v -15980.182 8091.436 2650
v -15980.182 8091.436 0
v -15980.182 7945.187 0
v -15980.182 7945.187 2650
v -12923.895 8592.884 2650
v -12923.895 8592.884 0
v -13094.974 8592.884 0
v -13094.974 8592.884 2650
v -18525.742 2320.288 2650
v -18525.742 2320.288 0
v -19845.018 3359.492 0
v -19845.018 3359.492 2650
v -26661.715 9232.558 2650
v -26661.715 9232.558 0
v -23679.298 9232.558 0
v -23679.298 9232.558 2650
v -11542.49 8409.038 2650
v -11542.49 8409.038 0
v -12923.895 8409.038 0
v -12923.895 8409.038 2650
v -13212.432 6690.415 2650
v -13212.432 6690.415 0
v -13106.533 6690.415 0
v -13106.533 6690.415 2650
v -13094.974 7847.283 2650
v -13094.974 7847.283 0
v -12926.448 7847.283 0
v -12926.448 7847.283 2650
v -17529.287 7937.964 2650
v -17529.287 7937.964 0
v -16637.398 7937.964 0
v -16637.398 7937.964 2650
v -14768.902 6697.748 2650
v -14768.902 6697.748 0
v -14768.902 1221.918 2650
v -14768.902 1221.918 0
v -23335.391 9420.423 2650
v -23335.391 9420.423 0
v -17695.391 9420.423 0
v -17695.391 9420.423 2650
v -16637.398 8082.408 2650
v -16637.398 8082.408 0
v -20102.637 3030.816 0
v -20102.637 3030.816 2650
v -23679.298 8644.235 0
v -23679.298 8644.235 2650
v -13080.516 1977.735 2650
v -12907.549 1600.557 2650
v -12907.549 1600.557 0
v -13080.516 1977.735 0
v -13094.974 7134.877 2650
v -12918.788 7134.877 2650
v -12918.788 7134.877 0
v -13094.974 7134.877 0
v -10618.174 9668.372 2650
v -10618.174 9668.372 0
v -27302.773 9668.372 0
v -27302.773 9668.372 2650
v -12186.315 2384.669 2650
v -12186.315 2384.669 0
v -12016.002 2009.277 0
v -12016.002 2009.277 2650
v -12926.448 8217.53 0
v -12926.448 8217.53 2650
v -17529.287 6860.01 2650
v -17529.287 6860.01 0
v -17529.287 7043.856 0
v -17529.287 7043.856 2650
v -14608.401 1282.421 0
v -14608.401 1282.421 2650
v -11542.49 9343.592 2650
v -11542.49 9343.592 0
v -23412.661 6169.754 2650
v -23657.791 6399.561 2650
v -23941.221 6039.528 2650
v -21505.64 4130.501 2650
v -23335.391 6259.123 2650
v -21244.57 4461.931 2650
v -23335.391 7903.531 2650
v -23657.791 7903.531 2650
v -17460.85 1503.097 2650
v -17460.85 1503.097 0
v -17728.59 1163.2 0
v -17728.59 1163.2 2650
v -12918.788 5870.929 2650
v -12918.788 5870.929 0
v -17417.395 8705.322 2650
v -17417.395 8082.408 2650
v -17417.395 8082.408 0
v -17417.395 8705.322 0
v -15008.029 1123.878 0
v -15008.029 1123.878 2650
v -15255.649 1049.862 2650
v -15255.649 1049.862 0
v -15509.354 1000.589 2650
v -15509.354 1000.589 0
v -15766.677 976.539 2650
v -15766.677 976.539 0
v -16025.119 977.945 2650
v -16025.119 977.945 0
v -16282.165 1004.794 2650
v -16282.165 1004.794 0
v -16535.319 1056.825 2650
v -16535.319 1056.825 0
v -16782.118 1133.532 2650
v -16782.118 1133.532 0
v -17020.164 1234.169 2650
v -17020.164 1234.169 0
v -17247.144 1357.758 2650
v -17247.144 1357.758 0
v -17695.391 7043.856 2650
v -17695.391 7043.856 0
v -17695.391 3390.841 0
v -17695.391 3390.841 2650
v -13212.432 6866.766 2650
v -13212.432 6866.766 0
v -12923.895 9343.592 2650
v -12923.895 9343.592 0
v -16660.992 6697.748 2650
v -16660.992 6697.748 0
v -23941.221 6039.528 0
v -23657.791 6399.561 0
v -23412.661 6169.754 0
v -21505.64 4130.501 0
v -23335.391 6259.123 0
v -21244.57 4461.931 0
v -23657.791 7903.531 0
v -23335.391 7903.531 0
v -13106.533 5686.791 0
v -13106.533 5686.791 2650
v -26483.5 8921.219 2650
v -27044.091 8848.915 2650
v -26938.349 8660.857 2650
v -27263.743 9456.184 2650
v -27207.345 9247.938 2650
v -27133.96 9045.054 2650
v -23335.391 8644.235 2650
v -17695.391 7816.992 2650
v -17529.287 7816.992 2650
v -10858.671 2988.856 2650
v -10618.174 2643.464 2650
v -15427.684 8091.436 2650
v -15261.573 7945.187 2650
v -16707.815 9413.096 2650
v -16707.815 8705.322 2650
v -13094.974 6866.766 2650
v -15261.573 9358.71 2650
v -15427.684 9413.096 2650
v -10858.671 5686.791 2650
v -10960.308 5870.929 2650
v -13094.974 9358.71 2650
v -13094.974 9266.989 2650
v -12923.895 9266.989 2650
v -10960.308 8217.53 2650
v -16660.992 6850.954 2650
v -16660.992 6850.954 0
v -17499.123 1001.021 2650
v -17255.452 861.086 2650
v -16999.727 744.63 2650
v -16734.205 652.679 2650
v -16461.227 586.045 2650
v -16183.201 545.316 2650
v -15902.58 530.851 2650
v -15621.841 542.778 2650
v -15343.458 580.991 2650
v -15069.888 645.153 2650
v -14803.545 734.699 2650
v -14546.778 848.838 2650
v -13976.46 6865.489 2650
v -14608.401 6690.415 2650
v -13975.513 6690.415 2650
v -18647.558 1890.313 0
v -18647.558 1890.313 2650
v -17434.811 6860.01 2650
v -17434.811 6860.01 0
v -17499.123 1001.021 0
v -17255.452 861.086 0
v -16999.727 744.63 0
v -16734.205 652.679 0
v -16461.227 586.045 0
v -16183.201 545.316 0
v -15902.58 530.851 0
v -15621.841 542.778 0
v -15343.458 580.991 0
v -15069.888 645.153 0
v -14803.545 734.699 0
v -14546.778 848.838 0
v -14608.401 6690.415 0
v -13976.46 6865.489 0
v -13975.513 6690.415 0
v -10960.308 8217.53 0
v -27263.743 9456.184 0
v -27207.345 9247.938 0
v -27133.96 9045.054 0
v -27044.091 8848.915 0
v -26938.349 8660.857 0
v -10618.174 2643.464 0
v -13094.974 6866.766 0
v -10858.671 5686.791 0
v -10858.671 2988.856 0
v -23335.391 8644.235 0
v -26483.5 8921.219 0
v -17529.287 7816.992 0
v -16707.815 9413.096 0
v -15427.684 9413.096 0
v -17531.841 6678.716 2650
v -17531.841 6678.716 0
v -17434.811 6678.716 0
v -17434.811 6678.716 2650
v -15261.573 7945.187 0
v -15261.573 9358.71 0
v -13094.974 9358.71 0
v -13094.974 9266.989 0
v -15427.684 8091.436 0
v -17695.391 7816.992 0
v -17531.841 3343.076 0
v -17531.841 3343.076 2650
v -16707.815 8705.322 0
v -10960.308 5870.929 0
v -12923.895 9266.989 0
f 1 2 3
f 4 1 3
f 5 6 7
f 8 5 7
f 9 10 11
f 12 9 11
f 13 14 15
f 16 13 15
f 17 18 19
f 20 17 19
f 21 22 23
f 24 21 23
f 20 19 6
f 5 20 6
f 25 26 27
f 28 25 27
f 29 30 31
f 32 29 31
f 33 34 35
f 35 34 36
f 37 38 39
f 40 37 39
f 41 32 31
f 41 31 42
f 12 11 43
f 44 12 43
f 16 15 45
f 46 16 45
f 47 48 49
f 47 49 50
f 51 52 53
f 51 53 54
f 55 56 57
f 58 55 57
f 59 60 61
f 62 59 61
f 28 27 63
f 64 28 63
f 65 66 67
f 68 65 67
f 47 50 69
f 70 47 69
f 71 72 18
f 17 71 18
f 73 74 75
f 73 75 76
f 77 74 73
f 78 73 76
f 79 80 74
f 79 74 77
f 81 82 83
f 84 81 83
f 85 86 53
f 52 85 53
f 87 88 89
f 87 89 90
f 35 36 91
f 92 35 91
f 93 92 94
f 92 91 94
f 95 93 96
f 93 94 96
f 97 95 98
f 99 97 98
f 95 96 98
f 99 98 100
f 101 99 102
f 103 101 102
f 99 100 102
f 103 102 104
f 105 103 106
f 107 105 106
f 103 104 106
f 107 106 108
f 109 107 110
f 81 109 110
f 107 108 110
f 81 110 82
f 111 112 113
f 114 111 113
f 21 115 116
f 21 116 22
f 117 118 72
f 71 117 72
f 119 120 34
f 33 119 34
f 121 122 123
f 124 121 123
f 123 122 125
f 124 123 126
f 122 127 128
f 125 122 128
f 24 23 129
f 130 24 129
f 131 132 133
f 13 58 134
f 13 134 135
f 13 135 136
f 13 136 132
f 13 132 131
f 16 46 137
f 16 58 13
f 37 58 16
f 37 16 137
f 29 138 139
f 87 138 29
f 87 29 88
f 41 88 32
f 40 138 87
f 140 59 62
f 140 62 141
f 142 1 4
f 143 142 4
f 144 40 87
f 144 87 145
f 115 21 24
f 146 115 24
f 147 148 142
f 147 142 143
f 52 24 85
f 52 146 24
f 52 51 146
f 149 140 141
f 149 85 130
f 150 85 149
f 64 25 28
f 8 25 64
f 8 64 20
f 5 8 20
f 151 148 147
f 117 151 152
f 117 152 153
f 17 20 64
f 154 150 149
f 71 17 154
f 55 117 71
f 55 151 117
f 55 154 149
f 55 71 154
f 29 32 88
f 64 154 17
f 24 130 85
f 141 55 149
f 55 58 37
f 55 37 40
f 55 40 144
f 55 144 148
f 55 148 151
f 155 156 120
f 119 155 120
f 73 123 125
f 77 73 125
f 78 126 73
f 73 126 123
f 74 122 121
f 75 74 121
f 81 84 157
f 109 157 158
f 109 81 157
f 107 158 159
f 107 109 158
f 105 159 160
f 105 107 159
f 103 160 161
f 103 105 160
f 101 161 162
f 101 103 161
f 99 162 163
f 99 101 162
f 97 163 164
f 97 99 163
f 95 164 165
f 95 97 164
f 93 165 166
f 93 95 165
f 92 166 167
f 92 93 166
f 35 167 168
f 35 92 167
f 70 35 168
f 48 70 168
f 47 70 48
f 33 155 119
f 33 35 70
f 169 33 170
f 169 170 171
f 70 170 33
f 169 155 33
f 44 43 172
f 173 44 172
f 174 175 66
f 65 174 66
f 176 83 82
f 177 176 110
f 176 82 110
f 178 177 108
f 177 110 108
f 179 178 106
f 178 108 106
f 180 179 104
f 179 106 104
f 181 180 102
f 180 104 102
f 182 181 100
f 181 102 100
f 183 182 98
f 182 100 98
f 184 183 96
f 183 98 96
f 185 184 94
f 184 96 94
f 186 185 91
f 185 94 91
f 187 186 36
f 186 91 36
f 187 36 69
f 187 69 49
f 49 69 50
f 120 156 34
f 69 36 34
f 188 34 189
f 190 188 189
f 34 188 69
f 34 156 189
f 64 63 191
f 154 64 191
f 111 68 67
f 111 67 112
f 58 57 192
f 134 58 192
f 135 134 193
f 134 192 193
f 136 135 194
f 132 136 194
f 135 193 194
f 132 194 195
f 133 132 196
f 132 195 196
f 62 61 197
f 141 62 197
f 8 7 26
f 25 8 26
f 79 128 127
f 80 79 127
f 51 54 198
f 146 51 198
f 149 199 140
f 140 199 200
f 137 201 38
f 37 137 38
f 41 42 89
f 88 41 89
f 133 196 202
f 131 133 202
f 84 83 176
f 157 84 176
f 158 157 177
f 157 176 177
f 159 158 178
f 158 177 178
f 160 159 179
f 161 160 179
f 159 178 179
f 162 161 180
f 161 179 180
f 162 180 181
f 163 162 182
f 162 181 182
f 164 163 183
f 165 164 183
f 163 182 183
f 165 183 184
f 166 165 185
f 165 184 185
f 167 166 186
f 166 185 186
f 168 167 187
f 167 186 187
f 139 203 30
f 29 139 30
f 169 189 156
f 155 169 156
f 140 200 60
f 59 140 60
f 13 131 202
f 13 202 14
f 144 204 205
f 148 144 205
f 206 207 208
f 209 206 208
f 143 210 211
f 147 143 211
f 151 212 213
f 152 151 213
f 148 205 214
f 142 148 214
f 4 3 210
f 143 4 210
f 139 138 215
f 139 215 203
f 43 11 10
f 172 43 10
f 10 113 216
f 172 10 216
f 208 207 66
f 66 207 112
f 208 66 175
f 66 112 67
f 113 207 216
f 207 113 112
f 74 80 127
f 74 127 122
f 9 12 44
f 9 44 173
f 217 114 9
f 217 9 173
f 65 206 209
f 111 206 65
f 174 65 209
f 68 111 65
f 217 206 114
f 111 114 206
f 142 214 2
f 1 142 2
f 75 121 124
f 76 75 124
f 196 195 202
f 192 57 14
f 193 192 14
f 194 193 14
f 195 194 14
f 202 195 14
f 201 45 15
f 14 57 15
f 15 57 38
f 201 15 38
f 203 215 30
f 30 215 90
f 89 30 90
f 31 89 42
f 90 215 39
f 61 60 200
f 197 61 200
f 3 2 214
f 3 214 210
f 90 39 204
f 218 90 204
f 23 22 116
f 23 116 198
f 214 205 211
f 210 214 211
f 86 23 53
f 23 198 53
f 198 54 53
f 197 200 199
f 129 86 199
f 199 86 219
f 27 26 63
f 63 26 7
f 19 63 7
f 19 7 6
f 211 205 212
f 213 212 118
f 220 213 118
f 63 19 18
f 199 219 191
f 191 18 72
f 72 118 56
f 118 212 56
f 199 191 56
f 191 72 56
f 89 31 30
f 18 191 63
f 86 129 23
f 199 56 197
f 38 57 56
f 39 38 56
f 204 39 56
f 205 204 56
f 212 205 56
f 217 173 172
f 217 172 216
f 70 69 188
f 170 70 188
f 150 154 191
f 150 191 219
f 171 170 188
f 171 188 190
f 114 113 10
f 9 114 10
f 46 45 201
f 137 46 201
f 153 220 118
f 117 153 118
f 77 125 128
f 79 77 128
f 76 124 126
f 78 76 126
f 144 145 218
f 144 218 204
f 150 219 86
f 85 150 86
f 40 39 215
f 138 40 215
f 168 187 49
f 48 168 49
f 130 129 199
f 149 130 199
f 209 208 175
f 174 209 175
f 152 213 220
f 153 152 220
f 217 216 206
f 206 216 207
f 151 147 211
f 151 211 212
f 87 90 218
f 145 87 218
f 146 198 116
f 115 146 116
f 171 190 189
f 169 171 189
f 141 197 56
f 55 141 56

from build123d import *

# Parameters (mm, degrees)
F2_DEPTH = 2650


# Not quite as in the source:
# - a feature of the source that left no trace in its solid (it failed there, or was rolled back) is left out


with BuildPart() as f2:
    # F1 (on Top) → F2 (new body)
    with BuildSketch(Plane.XY):
        with BuildLine():
            Line((-26938.3488437603, 8660.8567436642), (-26483.4995269775, 8921.2188720703))
            Line((-26483.4995269775, 8921.2188720703), (-26661.714553833, 9232.5582504272))
            Line((-26661.714553833, 9232.5582504272), (-23679.2984008789, 9232.5582504272))
            Line((-23679.2984008789, 9232.5582504272), (-23679.2984008789, 8644.2346572876))
            Line((-23679.2984008789, 8644.2346572876), (-23335.3906952519, 8644.2346572876))
            Line((-23335.3906952519, 8644.2346572876), (-23335.3906952519, 9420.423377643))
            Line((-23335.3906952519, 9420.423377643), (-17884.4909667969, 9420.423377643))
            Line((-17884.4909667969, 9420.423377643), (-17695.3906952519, 9420.423377643))
            Line((-17695.3906952519, 9420.423377643), (-17695.3906952519, 7816.9922828674))
            Line((-17695.3906952519, 7816.9922828674), (-17529.2873382568, 7816.9922828674))
            Line((-17529.2873382568, 7816.9922828674), (-17529.2873382568, 7937.9644393921))
            Line((-17529.2873382568, 7937.9644393921), (-16637.3977661133, 7937.9644393921))
            Line((-16637.3977661133, 7937.9644393921), (-16637.3977661133, 8082.407951355))
            Line((-16637.3977661133, 8082.407951355), (-17417.3946380615, 8082.407951355))
            Line((-17417.3946380615, 8082.407951355), (-17417.3946380615, 8705.322265625))
            Line((-17417.3946380615, 8705.322265625), (-16707.8151702881, 8705.322265625))
            Line((-16707.8151702881, 8705.322265625), (-16707.8151702881, 9413.0964279175))
            Line((-16707.8151702881, 9413.0964279175), (-15427.6838302612, 9413.0964279175))
            Line((-15427.6838302612, 9413.0964279175), (-15427.6838302612, 8091.4363861084))
            Line((-15427.6838302612, 8091.4363861084), (-15980.1816940308, 8091.4363861084))
            Line((-15980.1816940308, 8091.4363861084), (-15980.1816940308, 7945.1870918274))
            Line((-15980.1816940308, 7945.1870918274), (-15261.5728378296, 7945.1870918274))
            Line((-15261.5728378296, 7945.1870918274), (-15261.5728378296, 9358.7102890015))
            Line((-15261.5728378296, 9358.7102890015), (-13094.9735641479, 9358.7102890015))
            Line((-13094.9735641479, 9358.7102890015), (-13094.9735641479, 9266.9887542725))
            Line((-13094.9735641479, 9266.9887542725), (-12923.8948822021, 9266.9887542725))
            Line((-12923.8948822021, 9266.9887542725), (-12923.8948822021, 9343.5916900635))
            Line((-12923.8948822021, 9343.5916900635), (-11542.4900054932, 9343.5916900635))
            Line((-11542.4900054932, 9343.5916900635), (-11542.4900054932, 8409.0375900269))
            Line((-11542.4900054932, 8409.0375900269), (-12923.8948822021, 8409.0375900269))
            Line((-12923.8948822021, 8409.0375900269), (-12923.8948822021, 8592.8840637207))
            Line((-12923.8948822021, 8592.8840637207), (-13094.9735641479, 8592.8840637207))
            Line((-13094.9735641479, 8592.8840637207), (-13094.9735641479, 7847.2833633423))
            Line((-13094.9735641479, 7847.2833633423), (-12926.4478683472, 7847.2833633423))
            Line((-12926.4478683472, 7847.2833633423), (-12926.4478683472, 8217.5302505493))
            Line((-12926.4478683472, 8217.5302505493), (-10960.3080749512, 8217.5302505493))
            Line((-10960.3080749512, 8217.5302505493), (-10960.3080749512, 5870.9292411804))
            Line((-10960.3080749512, 5870.9292411804), (-12918.7879562378, 5870.9292411804))
            Line((-12918.7879562378, 5870.9292411804), (-12918.7879562378, 7134.8767280579))
            Line((-12918.7879562378, 7134.8767280579), (-13094.9735641479, 7134.8767280579))
            Line((-13094.9735641479, 7134.8767280579), (-13094.9735641479, 6866.7664527893))
            Line((-13094.9735641479, 6866.7664527893), (-13212.4319076538, 6866.7664527893))
            Line((-13212.4319076538, 6866.7664527893), (-13212.4319076538, 6690.4147962649))
            Line((-13212.4319076538, 6690.4147962649), (-13106.5330505371, 6690.4147962649))
            Line((-13106.5330505371, 6690.4147962649), (-13106.5330505371, 5686.7914199829))
            Line((-13106.5330505371, 5686.7914199829), (-10858.6711883545, 5686.7914199829))
            Line((-10858.6711883545, 5686.7914199829), (-10858.6711883545, 2988.8563156128))
            Line((-10858.6711883545, 2988.8563156128), (-12186.3150742964, 2384.6693368377))
            Line((-12186.3150742964, 2384.6693368377), (-12016.0019347874, 2009.2772593156))
            Line((-12016.0019347874, 2009.2772593156), (-10618.1735992432, 2643.4636116028))
            Line((-10618.1735992432, 2643.4636116028), (-10618.1735992432, 9668.3721542358))
            Line((-10618.1735992432, 9668.3721542358), (-26876.350402832, 9668.3721542358))
            Line((-26876.350402832, 9668.3721542358), (-27302.7725219727, 9668.3721542358))
            ThreePointArc((-27302.7725219727, 9668.3721542358), (-27172.7470980576, 9145.7383452427), (-26938.3488437603, 8660.8567436642))
        make_face()
    extrude(amount=F2_DEPTH)


with BuildPart() as f2b:
    # F1 (on Top) → F2, piece 2 (new body)
    with BuildSketch(Plane.XY):
        Polygon((-23657.7911376953, 6399.5614051819), (-23941.2212371826, 6039.5283699036), (-21505.6401140405, 4130.5005509388), (-21244.5698068112, 4461.9308067403), (-23412.6605987549, 6169.7535514832), (-23335.3906952519, 6259.1233253479), (-23335.3906952519, 7903.5310745239), (-23657.7911376953, 7903.5310745239), align=None)
    extrude(amount=F2_DEPTH)


with BuildPart() as f2c:
    # F1 (on Top) → F2, piece 3 (new body)
    with BuildSketch(Plane.XY):
        Polygon((-19845.0180308134, 3359.4924935591), (-20102.637378283, 3030.8158690385), (-18647.5582122803, 1890.3132677078), (-17531.8412780762, 3343.0762290955), (-17531.8412780762, 6678.7161827087), (-17434.8106384277, 6678.7161827087), (-17434.8106384277, 6860.0096702576), (-17529.2873382568, 6860.0096702576), (-17529.2873382568, 7043.8561439514), (-17695.3906952519, 7043.8561439514), (-17695.3906952519, 3390.8414840698), (-18525.7415771484, 2320.2877044678), align=None)
    extrude(amount=F2_DEPTH)


with BuildPart() as f2d:
    # F1 (on Top) → F2, piece 4 (new body)
    with BuildSketch(Plane.XY):
        with BuildLine():
            Line((-14546.7777252197, 848.8376140594), (-12907.5493286593, 1600.5574085741))
            Line((-12907.5493286593, 1600.5574085741), (-13080.5157991396, 1977.7345856727))
            Line((-13080.5157991396, 1977.7345856727), (-14608.4012985229, 1282.4212312698))
            Line((-14608.4012985229, 1282.4212312698), (-14608.4012985229, 6690.4147962649))
            Line((-14608.4012985229, 6690.4147962649), (-13975.5125153972, 6690.4147962649))
            Line((-13975.5125153972, 6690.4147962649), (-13976.4604568481, 6865.4890060425))
            Line((-13976.4604568481, 6865.4890060425), (-16660.9916687012, 6850.953578949))
            Line((-16660.9916687012, 6850.953578949), (-16660.9916687012, 6697.7481842041))
            Line((-16660.9916687012, 6697.7481842041), (-14768.9018249512, 6697.7481842041))
            Line((-14768.9018249512, 6697.7481842041), (-14768.9018249512, 1221.9181060791))
            ThreePointArc((-14768.9018249512, 1221.9181060791), (-16153.972963618, 988.199962581), (-17460.8497619629, 1503.0972957611))
            Line((-17460.8497619629, 1503.0972957611), (-17728.5898237902, 1163.199748156))
            ThreePointArc((-17728.5898237902, 1163.199748156), (-16183.2010610926, 545.3160790761), (-14546.7777252197, 848.8376140594))
        make_face()
    extrude(amount=F2_DEPTH)


solid = Compound([f2.part, f2b.part, f2c.part, f2d.part])
